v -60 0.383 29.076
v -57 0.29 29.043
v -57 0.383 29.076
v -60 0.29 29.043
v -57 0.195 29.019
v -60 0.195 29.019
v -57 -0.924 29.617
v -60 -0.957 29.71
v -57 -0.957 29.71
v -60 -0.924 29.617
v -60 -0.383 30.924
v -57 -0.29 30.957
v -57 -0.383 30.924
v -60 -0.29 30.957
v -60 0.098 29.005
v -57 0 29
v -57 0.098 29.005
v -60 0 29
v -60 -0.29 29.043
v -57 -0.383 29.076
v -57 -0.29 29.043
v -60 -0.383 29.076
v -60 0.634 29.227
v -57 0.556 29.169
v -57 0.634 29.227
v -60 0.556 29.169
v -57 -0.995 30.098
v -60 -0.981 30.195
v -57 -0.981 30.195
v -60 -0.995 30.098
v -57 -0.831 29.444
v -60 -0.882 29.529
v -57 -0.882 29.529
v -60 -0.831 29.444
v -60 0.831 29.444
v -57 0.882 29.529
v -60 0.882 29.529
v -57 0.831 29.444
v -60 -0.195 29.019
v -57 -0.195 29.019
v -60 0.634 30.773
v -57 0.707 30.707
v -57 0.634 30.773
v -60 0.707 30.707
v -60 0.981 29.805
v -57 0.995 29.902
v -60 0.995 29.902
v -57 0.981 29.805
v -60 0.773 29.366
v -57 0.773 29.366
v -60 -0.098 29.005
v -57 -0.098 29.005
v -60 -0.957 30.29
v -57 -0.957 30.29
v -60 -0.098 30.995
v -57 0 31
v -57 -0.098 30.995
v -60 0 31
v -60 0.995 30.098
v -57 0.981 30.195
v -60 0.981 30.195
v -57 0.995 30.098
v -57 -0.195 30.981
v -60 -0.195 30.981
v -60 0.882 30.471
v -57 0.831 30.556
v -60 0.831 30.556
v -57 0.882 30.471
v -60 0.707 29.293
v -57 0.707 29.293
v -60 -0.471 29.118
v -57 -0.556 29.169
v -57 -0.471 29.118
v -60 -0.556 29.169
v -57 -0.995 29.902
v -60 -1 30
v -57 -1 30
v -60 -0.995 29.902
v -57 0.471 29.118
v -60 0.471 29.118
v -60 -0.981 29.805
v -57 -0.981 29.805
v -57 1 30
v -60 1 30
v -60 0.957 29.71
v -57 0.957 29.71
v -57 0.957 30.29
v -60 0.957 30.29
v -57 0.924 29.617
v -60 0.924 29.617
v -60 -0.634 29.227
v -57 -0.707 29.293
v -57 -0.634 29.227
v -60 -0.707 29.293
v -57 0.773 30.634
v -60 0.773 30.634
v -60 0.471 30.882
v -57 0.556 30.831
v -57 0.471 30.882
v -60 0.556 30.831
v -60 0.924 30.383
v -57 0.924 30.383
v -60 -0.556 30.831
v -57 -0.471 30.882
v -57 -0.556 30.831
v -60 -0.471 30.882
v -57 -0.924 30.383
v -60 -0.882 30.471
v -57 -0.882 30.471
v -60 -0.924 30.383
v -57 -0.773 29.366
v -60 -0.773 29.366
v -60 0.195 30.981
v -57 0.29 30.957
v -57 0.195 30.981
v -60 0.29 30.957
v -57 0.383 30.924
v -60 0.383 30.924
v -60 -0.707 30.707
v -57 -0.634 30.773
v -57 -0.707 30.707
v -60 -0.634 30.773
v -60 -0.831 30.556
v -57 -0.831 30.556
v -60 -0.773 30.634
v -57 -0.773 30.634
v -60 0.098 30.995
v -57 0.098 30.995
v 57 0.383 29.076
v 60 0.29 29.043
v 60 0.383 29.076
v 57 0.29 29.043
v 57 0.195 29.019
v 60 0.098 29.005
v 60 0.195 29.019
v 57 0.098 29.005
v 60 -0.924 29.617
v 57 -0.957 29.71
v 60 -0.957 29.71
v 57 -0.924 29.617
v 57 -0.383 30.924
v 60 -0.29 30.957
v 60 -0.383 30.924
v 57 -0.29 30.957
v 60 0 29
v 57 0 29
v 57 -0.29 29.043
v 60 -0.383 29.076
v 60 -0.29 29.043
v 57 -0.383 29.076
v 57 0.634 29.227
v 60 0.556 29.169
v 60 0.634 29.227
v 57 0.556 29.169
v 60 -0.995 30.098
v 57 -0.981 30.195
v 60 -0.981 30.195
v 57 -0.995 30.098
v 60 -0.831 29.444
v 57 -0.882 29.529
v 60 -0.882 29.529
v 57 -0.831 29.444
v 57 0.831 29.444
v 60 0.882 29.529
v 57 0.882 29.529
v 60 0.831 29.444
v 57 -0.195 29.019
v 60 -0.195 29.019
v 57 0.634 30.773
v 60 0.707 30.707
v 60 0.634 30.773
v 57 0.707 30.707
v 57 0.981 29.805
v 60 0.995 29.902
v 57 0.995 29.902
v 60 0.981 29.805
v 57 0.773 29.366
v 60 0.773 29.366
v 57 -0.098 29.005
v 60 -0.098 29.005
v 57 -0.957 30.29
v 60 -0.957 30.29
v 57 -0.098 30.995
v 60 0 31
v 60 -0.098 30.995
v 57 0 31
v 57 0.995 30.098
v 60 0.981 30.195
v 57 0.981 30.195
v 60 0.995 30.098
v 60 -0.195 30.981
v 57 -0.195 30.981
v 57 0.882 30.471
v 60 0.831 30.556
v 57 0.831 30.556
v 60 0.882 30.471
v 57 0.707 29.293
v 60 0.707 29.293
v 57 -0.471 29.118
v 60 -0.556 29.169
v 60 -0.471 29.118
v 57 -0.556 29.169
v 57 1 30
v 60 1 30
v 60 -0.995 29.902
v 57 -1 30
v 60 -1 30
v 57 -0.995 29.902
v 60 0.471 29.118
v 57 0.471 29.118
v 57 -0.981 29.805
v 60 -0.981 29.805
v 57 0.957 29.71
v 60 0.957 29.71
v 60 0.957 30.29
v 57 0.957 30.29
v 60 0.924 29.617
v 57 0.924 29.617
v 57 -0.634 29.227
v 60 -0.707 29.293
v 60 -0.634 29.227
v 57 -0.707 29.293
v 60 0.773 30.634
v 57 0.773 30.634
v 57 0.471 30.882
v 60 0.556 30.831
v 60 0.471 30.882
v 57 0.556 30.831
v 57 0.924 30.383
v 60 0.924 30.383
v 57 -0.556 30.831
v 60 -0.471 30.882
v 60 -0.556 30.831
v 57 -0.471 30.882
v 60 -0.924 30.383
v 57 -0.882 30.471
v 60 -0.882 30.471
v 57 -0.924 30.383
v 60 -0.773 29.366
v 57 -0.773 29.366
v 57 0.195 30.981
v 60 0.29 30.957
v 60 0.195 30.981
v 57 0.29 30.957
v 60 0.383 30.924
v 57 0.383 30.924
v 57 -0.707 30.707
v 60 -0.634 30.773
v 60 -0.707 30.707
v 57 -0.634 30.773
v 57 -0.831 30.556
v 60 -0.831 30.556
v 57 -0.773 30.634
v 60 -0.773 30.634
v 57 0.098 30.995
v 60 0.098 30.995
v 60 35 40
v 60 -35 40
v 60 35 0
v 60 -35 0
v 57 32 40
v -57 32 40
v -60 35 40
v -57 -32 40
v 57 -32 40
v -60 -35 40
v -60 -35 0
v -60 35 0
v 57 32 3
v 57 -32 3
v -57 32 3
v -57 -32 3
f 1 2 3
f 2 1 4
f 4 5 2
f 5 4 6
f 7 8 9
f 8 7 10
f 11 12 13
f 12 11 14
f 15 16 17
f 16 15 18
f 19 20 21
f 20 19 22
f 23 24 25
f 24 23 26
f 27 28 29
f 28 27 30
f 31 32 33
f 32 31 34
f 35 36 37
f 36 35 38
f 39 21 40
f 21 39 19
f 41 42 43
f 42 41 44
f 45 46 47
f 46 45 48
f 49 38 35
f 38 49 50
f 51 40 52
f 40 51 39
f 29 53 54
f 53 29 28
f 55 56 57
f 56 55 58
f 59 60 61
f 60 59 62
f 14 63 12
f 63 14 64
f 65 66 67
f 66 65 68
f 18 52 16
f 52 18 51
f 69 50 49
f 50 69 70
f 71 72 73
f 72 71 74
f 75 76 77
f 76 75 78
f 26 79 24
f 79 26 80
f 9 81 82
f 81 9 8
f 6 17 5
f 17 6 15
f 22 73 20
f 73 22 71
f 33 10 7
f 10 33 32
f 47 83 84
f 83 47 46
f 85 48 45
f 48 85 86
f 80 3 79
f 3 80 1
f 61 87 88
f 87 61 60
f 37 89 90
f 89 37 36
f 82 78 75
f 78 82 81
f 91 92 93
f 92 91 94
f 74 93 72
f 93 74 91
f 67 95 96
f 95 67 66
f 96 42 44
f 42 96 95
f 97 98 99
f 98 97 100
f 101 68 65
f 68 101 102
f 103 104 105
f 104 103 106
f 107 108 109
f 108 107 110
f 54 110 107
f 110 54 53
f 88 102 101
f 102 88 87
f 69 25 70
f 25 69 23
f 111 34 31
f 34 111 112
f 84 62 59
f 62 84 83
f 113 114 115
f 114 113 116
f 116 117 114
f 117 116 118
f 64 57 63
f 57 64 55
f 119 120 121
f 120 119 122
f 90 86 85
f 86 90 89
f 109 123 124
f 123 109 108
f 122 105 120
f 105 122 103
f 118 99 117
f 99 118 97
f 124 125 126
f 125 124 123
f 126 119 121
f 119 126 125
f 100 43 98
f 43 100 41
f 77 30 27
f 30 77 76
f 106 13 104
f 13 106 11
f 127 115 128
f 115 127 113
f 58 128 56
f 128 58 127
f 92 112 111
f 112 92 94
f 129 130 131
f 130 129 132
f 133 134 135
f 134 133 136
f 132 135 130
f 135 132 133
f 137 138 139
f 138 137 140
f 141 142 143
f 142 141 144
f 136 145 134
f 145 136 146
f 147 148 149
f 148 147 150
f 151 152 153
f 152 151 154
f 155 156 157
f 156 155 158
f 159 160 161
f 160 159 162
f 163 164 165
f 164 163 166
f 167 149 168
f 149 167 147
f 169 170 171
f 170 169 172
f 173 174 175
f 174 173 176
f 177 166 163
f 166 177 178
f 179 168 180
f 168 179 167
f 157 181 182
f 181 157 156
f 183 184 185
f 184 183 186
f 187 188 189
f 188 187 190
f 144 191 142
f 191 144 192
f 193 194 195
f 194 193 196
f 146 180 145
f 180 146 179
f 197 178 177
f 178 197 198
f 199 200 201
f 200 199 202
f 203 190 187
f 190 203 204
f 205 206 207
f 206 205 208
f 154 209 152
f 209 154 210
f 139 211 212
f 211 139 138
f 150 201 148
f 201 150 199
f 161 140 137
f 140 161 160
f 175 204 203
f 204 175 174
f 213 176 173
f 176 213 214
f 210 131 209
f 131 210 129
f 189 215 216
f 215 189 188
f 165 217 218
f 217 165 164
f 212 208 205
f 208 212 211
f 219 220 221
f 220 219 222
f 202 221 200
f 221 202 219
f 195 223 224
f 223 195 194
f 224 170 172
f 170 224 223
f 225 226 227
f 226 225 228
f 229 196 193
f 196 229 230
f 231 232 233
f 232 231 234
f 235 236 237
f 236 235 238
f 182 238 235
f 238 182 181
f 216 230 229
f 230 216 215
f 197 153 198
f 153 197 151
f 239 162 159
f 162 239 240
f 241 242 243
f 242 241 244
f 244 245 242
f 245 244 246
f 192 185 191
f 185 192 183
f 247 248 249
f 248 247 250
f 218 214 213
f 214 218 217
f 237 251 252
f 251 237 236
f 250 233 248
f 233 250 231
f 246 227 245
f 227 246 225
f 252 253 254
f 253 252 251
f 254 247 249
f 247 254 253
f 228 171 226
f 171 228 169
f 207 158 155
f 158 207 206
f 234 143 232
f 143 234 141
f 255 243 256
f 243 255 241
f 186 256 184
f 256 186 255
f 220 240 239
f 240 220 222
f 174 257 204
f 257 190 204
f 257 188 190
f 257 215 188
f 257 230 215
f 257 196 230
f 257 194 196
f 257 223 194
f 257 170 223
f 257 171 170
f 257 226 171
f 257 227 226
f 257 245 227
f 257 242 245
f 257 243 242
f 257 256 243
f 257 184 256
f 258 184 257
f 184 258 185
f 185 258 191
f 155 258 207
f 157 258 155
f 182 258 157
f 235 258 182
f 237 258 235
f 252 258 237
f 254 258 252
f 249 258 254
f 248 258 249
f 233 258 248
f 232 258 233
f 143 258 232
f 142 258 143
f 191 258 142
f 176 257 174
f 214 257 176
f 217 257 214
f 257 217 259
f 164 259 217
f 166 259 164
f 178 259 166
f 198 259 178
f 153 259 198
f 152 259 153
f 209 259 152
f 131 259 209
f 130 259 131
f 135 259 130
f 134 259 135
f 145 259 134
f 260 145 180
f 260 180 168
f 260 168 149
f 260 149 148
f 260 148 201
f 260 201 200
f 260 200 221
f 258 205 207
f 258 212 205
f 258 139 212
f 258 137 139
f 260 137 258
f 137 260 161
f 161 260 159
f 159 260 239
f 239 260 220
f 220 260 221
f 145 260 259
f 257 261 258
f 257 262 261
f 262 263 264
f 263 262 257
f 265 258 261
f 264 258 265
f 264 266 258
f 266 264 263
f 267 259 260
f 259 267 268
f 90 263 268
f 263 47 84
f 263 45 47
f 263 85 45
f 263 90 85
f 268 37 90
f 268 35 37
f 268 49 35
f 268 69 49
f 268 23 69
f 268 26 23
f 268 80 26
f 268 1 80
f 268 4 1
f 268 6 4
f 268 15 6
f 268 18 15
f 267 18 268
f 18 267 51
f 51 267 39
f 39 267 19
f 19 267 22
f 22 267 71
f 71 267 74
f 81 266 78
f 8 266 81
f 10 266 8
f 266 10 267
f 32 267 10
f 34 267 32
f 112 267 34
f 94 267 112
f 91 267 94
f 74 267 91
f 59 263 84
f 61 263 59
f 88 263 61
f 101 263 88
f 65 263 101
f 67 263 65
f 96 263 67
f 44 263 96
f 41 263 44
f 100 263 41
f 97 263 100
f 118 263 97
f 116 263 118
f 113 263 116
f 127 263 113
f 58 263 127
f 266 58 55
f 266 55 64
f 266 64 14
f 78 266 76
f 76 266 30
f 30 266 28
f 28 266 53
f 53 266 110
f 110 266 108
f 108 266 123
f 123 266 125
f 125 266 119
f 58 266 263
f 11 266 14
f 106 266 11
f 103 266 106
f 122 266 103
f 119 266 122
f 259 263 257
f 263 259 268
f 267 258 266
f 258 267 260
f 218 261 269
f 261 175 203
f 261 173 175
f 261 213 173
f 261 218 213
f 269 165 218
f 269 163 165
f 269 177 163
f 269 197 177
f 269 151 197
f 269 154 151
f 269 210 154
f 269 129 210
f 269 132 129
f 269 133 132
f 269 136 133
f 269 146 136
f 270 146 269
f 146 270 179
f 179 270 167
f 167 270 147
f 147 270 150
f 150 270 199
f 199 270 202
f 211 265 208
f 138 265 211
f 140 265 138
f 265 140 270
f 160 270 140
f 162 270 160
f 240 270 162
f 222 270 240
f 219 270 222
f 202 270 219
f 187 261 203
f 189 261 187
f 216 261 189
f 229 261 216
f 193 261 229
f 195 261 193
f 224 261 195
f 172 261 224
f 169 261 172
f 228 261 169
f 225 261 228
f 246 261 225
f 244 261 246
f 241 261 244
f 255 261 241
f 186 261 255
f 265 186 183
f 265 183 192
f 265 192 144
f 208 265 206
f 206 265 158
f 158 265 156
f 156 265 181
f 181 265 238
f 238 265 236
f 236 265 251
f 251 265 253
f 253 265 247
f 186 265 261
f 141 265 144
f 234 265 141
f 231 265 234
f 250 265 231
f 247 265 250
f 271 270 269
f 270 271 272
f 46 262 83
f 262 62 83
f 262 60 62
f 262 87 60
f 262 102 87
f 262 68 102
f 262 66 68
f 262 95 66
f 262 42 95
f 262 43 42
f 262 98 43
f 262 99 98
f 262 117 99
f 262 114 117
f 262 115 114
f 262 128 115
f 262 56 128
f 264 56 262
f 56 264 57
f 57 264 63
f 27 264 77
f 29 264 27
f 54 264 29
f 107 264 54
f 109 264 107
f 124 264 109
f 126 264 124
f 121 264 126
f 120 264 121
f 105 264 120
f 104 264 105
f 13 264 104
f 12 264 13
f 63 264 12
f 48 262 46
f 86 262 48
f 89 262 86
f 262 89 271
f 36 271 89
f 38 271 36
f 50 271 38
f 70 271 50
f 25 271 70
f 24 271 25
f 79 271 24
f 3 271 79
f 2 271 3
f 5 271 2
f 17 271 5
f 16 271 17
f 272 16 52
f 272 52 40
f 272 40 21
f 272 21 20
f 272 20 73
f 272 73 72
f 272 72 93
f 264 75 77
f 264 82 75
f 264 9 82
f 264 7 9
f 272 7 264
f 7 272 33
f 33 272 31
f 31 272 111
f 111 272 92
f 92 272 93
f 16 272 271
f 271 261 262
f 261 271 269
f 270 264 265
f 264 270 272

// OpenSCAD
// Mini horizontal gel-electrophoresis buffer tank
// Print orientation: tank rests on XY plane, builds up +Z

$fn = 64;

// ---- Tank dimensions ----
outer_x = 120;   // outer length in X
outer_y = 70;    // outer width in Y
outer_z = 40;    // outer height in Z
wall    = 3;     // wall thickness
floor   = 3;     // floor thickness

// ---- Platform dimensions ----
plat_len   = 60;  // platform length in X
plat_top_z = 13;  // platform top height (10 mm above inner floor)

// ---- Wire holes ----
hole_d = 2;       // hole diameter
hole_y = 0;       // hole Y position
hole_z = 30;      // hole Z position

// ---- Derived ----
inner_f = outer_x - 2 * wall;  // inner floor length
inner_w = outer_y - 2 * wall;  // inner width (platform spans this)
plat_h = plat_top_z - floor;   // platform height above floor

difference() {
    // Tank body
    translate([-outer_x / 2, -outer_y / 2, 0])
        cube([outer_x, outer_y, outer_z]);

    // Open top (hollow above inner floor)
    translate([-inner_f / 2, -inner_w / 2, floor])
        cube([inner_f, inner_w, outer_z - floor]);

    // Raised platform in the middle
    translate([-inner_f / 2 + wall, -inner_w / 2, floor])
        cube([plat_len, inner_w, plat_h]);

    // Wire holes through each end wall, along X
    for (sx = [-1, 1])
        translate([sx > 0 ? inner_f / 2 - 1 : -inner_f / 2, hole_y, hole_z])
            rotate([0, 90, 0])
                cylinder(d = hole_d, h = outer_y + 2 * wall, center = true);
}
